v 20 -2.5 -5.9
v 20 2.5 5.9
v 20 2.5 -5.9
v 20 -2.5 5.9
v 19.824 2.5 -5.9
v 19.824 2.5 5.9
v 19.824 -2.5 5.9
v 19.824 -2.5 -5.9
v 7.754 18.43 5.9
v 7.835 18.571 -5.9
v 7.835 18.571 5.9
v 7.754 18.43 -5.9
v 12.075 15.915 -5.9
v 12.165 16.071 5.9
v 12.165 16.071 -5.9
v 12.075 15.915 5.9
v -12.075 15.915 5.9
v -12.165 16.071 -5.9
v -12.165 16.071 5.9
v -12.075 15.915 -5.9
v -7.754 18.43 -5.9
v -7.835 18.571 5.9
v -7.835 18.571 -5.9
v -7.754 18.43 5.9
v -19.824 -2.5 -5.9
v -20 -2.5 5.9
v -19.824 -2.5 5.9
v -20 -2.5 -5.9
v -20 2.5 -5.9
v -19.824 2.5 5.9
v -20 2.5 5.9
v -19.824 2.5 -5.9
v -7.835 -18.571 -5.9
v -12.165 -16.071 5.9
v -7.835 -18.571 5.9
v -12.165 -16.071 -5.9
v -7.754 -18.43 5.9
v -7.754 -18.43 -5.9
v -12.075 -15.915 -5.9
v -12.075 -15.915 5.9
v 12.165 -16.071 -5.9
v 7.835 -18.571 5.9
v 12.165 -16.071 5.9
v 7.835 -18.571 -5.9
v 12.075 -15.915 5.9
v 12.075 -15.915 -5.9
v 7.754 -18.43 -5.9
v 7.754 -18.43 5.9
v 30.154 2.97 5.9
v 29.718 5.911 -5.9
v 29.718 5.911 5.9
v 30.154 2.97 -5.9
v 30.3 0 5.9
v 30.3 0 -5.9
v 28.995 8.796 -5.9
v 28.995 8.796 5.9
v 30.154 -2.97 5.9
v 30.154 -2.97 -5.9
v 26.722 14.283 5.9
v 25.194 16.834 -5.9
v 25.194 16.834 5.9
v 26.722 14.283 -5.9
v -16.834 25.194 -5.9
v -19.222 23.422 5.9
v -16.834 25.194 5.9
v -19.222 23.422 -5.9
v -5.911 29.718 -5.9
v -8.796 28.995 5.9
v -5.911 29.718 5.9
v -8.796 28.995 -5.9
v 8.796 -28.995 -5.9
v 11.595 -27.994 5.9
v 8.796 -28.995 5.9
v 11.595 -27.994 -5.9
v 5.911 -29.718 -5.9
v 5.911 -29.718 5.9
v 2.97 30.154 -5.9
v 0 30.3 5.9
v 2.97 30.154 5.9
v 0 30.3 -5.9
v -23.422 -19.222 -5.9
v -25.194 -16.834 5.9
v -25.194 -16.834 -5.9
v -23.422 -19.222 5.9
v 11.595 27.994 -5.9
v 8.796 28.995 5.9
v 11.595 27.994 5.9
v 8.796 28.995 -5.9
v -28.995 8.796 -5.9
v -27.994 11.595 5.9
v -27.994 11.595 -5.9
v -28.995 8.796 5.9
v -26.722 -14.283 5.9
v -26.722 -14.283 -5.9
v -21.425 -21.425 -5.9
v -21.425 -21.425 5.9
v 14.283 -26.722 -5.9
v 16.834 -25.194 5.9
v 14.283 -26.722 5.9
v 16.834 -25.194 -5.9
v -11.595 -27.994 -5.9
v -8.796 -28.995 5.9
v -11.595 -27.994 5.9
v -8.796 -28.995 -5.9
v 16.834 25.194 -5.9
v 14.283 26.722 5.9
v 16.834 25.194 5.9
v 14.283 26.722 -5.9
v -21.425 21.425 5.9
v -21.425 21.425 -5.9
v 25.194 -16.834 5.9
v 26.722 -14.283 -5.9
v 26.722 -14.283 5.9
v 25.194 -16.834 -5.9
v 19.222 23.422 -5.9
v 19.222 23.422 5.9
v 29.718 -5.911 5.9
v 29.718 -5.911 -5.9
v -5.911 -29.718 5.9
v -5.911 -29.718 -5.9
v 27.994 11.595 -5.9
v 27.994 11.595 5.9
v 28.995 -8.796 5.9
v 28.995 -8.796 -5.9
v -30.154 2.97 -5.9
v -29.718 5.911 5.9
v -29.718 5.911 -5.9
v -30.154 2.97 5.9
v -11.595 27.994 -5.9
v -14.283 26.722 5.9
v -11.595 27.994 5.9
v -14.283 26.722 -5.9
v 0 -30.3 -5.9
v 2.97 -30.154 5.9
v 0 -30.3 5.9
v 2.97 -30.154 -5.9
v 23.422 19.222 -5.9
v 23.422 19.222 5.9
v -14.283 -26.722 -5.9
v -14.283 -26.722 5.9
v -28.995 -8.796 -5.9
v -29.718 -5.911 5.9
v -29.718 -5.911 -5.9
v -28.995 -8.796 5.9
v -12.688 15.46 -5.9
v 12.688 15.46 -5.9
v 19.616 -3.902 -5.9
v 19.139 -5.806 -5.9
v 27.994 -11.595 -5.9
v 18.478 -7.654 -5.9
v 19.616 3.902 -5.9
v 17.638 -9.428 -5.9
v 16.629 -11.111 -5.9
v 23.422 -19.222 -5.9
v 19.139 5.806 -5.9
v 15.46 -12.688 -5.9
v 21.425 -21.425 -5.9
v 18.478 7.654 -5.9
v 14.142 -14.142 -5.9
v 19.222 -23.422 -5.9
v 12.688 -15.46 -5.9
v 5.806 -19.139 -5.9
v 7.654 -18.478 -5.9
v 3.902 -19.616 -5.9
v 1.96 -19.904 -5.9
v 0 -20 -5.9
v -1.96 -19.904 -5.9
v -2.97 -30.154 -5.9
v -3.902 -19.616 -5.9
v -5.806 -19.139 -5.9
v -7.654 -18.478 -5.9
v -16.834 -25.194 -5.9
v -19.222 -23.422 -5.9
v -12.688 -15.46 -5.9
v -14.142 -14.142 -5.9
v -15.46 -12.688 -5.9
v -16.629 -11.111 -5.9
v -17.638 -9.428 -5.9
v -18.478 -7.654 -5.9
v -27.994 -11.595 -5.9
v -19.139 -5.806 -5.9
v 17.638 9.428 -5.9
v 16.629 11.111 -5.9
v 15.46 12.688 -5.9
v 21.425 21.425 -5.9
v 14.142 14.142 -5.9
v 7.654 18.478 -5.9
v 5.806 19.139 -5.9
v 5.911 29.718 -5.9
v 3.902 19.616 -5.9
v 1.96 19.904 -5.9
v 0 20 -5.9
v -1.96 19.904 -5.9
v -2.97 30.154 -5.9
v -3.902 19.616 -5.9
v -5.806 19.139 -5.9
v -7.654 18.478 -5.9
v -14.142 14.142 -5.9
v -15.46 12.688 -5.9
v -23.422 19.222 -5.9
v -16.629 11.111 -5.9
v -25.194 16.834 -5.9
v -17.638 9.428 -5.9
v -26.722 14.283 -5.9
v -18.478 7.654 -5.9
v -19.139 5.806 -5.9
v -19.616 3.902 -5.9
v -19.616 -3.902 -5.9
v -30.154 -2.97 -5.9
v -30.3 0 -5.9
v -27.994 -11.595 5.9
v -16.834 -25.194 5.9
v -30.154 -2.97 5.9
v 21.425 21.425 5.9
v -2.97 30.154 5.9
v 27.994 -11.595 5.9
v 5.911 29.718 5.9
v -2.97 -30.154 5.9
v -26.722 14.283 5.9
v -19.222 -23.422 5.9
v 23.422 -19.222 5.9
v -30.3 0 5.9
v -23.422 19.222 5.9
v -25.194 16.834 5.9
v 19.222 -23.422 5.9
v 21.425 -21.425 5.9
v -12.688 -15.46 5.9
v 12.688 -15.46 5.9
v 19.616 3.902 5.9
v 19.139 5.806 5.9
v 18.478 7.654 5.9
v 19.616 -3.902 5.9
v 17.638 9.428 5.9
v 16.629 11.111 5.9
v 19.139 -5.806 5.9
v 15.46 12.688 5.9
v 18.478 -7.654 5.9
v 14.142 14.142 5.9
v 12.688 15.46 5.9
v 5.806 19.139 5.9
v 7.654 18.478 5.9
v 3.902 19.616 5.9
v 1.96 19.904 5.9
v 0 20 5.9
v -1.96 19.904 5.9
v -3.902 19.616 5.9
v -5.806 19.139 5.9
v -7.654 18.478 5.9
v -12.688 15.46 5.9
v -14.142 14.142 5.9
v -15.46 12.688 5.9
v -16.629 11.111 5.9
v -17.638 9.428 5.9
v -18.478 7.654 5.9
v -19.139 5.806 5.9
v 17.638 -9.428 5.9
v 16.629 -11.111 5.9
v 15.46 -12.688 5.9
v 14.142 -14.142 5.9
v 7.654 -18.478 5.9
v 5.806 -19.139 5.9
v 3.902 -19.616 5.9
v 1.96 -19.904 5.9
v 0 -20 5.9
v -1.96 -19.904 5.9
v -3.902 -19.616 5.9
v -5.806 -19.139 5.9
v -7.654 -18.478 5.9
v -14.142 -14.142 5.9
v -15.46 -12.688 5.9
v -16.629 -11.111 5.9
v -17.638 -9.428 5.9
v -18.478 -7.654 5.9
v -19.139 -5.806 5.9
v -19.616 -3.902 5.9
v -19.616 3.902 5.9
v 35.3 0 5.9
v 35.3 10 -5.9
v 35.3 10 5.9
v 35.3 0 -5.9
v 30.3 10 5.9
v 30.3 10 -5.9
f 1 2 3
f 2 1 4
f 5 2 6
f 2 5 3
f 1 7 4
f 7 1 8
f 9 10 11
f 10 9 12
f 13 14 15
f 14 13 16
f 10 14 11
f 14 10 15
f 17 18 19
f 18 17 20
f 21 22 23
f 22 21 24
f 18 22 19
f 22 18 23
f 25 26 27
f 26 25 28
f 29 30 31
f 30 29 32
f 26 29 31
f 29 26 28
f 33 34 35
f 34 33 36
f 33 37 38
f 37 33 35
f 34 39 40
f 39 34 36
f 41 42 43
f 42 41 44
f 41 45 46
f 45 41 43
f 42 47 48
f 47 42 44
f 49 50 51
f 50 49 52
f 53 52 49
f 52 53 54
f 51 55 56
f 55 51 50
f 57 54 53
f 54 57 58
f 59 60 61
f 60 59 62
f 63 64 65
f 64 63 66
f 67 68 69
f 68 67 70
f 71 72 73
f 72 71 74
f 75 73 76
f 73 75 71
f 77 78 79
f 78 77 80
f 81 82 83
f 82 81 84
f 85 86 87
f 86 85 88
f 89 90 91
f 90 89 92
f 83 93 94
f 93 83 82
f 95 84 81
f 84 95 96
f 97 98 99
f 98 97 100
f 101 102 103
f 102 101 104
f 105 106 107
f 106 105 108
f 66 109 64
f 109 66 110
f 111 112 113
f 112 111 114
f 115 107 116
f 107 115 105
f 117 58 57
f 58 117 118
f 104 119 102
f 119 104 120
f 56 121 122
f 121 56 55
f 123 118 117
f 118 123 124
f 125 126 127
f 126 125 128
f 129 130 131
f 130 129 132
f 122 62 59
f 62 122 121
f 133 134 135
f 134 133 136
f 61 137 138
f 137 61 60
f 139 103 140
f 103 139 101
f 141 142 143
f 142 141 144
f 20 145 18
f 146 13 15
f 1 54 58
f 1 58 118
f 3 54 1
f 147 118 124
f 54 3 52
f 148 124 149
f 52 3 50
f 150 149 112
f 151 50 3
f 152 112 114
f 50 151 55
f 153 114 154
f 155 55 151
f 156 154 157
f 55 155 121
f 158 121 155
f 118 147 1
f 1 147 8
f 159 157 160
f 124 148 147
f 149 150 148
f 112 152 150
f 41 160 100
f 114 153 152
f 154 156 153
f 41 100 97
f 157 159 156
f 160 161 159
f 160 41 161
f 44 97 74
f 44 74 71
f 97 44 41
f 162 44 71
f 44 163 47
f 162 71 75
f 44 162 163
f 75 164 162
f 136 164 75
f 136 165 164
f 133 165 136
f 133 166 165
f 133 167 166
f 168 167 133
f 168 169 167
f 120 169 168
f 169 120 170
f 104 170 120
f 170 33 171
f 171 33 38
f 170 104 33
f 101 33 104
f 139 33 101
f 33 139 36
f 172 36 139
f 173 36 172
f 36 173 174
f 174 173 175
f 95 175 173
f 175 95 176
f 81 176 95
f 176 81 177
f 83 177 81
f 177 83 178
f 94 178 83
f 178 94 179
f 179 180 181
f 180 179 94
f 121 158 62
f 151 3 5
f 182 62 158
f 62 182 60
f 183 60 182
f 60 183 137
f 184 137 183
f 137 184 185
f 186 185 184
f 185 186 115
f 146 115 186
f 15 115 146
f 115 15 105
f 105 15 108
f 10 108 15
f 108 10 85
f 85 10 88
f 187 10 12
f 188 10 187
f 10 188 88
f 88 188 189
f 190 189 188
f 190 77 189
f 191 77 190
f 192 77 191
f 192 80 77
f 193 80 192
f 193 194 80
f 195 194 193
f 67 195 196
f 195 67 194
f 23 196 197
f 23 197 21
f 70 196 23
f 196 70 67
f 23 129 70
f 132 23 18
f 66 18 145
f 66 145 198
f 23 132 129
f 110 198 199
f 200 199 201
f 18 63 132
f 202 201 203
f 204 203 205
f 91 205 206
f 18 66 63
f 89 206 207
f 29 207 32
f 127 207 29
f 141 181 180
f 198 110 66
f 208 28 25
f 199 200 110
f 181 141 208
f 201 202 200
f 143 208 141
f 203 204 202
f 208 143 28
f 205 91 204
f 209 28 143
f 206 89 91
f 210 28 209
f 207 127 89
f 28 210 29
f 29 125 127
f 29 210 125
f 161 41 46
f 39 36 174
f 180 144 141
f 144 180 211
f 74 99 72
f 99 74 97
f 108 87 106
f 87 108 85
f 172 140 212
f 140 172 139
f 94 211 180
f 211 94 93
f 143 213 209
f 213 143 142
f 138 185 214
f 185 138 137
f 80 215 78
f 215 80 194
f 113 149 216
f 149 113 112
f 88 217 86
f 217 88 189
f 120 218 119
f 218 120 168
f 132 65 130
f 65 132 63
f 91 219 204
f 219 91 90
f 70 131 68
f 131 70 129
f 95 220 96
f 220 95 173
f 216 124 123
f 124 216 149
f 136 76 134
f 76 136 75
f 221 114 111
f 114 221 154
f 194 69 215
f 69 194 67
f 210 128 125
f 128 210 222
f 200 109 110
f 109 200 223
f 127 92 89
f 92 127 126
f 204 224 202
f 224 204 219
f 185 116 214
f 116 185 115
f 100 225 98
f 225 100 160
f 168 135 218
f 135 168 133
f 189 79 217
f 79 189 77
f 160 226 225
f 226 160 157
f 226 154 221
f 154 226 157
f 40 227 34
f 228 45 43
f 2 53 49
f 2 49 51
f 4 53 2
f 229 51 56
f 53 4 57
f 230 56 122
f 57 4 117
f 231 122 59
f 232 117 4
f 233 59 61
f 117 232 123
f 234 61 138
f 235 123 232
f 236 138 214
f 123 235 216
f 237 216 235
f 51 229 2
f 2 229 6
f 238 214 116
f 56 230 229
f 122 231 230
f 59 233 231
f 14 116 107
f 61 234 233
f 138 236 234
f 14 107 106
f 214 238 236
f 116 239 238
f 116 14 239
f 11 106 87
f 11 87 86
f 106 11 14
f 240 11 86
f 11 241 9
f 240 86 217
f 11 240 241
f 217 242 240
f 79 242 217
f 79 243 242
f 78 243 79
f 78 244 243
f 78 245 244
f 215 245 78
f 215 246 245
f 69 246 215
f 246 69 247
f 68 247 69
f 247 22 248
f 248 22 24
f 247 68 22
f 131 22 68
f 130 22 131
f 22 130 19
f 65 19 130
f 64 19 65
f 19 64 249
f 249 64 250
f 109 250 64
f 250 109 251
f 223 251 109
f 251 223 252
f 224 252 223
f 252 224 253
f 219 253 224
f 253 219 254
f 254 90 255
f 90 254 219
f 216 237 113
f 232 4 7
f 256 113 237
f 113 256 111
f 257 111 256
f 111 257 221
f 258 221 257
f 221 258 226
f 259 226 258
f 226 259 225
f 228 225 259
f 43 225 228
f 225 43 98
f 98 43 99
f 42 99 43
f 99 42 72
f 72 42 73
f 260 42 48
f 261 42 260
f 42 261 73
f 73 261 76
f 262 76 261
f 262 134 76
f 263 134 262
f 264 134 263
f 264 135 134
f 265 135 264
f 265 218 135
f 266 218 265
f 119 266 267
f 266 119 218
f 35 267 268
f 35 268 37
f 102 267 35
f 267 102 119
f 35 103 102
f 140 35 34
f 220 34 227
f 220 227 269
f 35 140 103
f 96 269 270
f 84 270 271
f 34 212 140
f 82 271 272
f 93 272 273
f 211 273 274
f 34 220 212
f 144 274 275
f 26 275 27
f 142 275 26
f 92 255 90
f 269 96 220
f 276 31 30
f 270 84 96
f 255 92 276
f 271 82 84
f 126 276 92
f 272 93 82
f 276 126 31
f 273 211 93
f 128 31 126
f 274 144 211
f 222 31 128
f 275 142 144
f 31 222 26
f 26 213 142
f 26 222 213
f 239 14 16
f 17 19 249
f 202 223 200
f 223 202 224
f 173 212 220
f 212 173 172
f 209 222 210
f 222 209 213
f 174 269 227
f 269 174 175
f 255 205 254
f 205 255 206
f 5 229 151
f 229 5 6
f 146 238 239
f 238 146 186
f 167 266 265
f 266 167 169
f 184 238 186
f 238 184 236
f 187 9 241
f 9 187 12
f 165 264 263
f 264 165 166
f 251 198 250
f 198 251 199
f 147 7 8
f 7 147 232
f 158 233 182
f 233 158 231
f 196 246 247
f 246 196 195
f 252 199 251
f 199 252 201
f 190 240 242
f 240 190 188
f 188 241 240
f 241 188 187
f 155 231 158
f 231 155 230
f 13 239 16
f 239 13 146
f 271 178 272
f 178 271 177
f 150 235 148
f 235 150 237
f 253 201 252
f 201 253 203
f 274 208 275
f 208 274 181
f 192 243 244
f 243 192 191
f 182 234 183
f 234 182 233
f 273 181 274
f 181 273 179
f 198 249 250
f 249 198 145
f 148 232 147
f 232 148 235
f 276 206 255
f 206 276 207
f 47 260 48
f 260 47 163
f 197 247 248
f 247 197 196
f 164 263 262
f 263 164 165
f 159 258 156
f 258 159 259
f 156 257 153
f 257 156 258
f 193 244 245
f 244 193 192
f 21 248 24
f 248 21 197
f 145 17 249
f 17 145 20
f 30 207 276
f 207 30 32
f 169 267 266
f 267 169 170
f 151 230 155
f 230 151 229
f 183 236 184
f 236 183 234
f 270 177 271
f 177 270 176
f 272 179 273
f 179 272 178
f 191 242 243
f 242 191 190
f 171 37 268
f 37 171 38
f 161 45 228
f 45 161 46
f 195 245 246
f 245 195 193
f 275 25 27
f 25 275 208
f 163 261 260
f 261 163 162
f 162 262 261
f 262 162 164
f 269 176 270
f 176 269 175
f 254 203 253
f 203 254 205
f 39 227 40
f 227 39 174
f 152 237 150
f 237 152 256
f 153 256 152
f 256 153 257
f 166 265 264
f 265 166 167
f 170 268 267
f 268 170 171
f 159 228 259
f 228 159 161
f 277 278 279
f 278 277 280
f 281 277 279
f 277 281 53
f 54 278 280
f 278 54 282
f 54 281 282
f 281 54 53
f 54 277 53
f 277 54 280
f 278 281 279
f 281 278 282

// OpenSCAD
module annular_ring() {
    difference() {
        // Outer cylinder
        cylinder(h=11.8, r=30.3, $fn=64);
        
        // Inner cylinder (large central opening)
        translate([0, 0, -1])
            cylinder(h=13.8, r=20, $fn=64);
        
        // Rectangular notches on the inner diameter
        for (i = [0:5]) {
            rotate([0, 0, i * 60])
                translate([15, -2.5, -1])
                    cube([5, 5, 13.8]);
        }
    }
}

module external_tabs() {
    union() {
        // First tab
        translate([30.3, 0, 0])
            cube([5, 5, 11.8]);
        
        // Second tab
        translate([30.3, 5, 0])
            cube([5, 5, 11.8]);
    }
}

translate([0, 0, -5.9])
    union() {
        annular_ring();
        external_tabs();
    }
